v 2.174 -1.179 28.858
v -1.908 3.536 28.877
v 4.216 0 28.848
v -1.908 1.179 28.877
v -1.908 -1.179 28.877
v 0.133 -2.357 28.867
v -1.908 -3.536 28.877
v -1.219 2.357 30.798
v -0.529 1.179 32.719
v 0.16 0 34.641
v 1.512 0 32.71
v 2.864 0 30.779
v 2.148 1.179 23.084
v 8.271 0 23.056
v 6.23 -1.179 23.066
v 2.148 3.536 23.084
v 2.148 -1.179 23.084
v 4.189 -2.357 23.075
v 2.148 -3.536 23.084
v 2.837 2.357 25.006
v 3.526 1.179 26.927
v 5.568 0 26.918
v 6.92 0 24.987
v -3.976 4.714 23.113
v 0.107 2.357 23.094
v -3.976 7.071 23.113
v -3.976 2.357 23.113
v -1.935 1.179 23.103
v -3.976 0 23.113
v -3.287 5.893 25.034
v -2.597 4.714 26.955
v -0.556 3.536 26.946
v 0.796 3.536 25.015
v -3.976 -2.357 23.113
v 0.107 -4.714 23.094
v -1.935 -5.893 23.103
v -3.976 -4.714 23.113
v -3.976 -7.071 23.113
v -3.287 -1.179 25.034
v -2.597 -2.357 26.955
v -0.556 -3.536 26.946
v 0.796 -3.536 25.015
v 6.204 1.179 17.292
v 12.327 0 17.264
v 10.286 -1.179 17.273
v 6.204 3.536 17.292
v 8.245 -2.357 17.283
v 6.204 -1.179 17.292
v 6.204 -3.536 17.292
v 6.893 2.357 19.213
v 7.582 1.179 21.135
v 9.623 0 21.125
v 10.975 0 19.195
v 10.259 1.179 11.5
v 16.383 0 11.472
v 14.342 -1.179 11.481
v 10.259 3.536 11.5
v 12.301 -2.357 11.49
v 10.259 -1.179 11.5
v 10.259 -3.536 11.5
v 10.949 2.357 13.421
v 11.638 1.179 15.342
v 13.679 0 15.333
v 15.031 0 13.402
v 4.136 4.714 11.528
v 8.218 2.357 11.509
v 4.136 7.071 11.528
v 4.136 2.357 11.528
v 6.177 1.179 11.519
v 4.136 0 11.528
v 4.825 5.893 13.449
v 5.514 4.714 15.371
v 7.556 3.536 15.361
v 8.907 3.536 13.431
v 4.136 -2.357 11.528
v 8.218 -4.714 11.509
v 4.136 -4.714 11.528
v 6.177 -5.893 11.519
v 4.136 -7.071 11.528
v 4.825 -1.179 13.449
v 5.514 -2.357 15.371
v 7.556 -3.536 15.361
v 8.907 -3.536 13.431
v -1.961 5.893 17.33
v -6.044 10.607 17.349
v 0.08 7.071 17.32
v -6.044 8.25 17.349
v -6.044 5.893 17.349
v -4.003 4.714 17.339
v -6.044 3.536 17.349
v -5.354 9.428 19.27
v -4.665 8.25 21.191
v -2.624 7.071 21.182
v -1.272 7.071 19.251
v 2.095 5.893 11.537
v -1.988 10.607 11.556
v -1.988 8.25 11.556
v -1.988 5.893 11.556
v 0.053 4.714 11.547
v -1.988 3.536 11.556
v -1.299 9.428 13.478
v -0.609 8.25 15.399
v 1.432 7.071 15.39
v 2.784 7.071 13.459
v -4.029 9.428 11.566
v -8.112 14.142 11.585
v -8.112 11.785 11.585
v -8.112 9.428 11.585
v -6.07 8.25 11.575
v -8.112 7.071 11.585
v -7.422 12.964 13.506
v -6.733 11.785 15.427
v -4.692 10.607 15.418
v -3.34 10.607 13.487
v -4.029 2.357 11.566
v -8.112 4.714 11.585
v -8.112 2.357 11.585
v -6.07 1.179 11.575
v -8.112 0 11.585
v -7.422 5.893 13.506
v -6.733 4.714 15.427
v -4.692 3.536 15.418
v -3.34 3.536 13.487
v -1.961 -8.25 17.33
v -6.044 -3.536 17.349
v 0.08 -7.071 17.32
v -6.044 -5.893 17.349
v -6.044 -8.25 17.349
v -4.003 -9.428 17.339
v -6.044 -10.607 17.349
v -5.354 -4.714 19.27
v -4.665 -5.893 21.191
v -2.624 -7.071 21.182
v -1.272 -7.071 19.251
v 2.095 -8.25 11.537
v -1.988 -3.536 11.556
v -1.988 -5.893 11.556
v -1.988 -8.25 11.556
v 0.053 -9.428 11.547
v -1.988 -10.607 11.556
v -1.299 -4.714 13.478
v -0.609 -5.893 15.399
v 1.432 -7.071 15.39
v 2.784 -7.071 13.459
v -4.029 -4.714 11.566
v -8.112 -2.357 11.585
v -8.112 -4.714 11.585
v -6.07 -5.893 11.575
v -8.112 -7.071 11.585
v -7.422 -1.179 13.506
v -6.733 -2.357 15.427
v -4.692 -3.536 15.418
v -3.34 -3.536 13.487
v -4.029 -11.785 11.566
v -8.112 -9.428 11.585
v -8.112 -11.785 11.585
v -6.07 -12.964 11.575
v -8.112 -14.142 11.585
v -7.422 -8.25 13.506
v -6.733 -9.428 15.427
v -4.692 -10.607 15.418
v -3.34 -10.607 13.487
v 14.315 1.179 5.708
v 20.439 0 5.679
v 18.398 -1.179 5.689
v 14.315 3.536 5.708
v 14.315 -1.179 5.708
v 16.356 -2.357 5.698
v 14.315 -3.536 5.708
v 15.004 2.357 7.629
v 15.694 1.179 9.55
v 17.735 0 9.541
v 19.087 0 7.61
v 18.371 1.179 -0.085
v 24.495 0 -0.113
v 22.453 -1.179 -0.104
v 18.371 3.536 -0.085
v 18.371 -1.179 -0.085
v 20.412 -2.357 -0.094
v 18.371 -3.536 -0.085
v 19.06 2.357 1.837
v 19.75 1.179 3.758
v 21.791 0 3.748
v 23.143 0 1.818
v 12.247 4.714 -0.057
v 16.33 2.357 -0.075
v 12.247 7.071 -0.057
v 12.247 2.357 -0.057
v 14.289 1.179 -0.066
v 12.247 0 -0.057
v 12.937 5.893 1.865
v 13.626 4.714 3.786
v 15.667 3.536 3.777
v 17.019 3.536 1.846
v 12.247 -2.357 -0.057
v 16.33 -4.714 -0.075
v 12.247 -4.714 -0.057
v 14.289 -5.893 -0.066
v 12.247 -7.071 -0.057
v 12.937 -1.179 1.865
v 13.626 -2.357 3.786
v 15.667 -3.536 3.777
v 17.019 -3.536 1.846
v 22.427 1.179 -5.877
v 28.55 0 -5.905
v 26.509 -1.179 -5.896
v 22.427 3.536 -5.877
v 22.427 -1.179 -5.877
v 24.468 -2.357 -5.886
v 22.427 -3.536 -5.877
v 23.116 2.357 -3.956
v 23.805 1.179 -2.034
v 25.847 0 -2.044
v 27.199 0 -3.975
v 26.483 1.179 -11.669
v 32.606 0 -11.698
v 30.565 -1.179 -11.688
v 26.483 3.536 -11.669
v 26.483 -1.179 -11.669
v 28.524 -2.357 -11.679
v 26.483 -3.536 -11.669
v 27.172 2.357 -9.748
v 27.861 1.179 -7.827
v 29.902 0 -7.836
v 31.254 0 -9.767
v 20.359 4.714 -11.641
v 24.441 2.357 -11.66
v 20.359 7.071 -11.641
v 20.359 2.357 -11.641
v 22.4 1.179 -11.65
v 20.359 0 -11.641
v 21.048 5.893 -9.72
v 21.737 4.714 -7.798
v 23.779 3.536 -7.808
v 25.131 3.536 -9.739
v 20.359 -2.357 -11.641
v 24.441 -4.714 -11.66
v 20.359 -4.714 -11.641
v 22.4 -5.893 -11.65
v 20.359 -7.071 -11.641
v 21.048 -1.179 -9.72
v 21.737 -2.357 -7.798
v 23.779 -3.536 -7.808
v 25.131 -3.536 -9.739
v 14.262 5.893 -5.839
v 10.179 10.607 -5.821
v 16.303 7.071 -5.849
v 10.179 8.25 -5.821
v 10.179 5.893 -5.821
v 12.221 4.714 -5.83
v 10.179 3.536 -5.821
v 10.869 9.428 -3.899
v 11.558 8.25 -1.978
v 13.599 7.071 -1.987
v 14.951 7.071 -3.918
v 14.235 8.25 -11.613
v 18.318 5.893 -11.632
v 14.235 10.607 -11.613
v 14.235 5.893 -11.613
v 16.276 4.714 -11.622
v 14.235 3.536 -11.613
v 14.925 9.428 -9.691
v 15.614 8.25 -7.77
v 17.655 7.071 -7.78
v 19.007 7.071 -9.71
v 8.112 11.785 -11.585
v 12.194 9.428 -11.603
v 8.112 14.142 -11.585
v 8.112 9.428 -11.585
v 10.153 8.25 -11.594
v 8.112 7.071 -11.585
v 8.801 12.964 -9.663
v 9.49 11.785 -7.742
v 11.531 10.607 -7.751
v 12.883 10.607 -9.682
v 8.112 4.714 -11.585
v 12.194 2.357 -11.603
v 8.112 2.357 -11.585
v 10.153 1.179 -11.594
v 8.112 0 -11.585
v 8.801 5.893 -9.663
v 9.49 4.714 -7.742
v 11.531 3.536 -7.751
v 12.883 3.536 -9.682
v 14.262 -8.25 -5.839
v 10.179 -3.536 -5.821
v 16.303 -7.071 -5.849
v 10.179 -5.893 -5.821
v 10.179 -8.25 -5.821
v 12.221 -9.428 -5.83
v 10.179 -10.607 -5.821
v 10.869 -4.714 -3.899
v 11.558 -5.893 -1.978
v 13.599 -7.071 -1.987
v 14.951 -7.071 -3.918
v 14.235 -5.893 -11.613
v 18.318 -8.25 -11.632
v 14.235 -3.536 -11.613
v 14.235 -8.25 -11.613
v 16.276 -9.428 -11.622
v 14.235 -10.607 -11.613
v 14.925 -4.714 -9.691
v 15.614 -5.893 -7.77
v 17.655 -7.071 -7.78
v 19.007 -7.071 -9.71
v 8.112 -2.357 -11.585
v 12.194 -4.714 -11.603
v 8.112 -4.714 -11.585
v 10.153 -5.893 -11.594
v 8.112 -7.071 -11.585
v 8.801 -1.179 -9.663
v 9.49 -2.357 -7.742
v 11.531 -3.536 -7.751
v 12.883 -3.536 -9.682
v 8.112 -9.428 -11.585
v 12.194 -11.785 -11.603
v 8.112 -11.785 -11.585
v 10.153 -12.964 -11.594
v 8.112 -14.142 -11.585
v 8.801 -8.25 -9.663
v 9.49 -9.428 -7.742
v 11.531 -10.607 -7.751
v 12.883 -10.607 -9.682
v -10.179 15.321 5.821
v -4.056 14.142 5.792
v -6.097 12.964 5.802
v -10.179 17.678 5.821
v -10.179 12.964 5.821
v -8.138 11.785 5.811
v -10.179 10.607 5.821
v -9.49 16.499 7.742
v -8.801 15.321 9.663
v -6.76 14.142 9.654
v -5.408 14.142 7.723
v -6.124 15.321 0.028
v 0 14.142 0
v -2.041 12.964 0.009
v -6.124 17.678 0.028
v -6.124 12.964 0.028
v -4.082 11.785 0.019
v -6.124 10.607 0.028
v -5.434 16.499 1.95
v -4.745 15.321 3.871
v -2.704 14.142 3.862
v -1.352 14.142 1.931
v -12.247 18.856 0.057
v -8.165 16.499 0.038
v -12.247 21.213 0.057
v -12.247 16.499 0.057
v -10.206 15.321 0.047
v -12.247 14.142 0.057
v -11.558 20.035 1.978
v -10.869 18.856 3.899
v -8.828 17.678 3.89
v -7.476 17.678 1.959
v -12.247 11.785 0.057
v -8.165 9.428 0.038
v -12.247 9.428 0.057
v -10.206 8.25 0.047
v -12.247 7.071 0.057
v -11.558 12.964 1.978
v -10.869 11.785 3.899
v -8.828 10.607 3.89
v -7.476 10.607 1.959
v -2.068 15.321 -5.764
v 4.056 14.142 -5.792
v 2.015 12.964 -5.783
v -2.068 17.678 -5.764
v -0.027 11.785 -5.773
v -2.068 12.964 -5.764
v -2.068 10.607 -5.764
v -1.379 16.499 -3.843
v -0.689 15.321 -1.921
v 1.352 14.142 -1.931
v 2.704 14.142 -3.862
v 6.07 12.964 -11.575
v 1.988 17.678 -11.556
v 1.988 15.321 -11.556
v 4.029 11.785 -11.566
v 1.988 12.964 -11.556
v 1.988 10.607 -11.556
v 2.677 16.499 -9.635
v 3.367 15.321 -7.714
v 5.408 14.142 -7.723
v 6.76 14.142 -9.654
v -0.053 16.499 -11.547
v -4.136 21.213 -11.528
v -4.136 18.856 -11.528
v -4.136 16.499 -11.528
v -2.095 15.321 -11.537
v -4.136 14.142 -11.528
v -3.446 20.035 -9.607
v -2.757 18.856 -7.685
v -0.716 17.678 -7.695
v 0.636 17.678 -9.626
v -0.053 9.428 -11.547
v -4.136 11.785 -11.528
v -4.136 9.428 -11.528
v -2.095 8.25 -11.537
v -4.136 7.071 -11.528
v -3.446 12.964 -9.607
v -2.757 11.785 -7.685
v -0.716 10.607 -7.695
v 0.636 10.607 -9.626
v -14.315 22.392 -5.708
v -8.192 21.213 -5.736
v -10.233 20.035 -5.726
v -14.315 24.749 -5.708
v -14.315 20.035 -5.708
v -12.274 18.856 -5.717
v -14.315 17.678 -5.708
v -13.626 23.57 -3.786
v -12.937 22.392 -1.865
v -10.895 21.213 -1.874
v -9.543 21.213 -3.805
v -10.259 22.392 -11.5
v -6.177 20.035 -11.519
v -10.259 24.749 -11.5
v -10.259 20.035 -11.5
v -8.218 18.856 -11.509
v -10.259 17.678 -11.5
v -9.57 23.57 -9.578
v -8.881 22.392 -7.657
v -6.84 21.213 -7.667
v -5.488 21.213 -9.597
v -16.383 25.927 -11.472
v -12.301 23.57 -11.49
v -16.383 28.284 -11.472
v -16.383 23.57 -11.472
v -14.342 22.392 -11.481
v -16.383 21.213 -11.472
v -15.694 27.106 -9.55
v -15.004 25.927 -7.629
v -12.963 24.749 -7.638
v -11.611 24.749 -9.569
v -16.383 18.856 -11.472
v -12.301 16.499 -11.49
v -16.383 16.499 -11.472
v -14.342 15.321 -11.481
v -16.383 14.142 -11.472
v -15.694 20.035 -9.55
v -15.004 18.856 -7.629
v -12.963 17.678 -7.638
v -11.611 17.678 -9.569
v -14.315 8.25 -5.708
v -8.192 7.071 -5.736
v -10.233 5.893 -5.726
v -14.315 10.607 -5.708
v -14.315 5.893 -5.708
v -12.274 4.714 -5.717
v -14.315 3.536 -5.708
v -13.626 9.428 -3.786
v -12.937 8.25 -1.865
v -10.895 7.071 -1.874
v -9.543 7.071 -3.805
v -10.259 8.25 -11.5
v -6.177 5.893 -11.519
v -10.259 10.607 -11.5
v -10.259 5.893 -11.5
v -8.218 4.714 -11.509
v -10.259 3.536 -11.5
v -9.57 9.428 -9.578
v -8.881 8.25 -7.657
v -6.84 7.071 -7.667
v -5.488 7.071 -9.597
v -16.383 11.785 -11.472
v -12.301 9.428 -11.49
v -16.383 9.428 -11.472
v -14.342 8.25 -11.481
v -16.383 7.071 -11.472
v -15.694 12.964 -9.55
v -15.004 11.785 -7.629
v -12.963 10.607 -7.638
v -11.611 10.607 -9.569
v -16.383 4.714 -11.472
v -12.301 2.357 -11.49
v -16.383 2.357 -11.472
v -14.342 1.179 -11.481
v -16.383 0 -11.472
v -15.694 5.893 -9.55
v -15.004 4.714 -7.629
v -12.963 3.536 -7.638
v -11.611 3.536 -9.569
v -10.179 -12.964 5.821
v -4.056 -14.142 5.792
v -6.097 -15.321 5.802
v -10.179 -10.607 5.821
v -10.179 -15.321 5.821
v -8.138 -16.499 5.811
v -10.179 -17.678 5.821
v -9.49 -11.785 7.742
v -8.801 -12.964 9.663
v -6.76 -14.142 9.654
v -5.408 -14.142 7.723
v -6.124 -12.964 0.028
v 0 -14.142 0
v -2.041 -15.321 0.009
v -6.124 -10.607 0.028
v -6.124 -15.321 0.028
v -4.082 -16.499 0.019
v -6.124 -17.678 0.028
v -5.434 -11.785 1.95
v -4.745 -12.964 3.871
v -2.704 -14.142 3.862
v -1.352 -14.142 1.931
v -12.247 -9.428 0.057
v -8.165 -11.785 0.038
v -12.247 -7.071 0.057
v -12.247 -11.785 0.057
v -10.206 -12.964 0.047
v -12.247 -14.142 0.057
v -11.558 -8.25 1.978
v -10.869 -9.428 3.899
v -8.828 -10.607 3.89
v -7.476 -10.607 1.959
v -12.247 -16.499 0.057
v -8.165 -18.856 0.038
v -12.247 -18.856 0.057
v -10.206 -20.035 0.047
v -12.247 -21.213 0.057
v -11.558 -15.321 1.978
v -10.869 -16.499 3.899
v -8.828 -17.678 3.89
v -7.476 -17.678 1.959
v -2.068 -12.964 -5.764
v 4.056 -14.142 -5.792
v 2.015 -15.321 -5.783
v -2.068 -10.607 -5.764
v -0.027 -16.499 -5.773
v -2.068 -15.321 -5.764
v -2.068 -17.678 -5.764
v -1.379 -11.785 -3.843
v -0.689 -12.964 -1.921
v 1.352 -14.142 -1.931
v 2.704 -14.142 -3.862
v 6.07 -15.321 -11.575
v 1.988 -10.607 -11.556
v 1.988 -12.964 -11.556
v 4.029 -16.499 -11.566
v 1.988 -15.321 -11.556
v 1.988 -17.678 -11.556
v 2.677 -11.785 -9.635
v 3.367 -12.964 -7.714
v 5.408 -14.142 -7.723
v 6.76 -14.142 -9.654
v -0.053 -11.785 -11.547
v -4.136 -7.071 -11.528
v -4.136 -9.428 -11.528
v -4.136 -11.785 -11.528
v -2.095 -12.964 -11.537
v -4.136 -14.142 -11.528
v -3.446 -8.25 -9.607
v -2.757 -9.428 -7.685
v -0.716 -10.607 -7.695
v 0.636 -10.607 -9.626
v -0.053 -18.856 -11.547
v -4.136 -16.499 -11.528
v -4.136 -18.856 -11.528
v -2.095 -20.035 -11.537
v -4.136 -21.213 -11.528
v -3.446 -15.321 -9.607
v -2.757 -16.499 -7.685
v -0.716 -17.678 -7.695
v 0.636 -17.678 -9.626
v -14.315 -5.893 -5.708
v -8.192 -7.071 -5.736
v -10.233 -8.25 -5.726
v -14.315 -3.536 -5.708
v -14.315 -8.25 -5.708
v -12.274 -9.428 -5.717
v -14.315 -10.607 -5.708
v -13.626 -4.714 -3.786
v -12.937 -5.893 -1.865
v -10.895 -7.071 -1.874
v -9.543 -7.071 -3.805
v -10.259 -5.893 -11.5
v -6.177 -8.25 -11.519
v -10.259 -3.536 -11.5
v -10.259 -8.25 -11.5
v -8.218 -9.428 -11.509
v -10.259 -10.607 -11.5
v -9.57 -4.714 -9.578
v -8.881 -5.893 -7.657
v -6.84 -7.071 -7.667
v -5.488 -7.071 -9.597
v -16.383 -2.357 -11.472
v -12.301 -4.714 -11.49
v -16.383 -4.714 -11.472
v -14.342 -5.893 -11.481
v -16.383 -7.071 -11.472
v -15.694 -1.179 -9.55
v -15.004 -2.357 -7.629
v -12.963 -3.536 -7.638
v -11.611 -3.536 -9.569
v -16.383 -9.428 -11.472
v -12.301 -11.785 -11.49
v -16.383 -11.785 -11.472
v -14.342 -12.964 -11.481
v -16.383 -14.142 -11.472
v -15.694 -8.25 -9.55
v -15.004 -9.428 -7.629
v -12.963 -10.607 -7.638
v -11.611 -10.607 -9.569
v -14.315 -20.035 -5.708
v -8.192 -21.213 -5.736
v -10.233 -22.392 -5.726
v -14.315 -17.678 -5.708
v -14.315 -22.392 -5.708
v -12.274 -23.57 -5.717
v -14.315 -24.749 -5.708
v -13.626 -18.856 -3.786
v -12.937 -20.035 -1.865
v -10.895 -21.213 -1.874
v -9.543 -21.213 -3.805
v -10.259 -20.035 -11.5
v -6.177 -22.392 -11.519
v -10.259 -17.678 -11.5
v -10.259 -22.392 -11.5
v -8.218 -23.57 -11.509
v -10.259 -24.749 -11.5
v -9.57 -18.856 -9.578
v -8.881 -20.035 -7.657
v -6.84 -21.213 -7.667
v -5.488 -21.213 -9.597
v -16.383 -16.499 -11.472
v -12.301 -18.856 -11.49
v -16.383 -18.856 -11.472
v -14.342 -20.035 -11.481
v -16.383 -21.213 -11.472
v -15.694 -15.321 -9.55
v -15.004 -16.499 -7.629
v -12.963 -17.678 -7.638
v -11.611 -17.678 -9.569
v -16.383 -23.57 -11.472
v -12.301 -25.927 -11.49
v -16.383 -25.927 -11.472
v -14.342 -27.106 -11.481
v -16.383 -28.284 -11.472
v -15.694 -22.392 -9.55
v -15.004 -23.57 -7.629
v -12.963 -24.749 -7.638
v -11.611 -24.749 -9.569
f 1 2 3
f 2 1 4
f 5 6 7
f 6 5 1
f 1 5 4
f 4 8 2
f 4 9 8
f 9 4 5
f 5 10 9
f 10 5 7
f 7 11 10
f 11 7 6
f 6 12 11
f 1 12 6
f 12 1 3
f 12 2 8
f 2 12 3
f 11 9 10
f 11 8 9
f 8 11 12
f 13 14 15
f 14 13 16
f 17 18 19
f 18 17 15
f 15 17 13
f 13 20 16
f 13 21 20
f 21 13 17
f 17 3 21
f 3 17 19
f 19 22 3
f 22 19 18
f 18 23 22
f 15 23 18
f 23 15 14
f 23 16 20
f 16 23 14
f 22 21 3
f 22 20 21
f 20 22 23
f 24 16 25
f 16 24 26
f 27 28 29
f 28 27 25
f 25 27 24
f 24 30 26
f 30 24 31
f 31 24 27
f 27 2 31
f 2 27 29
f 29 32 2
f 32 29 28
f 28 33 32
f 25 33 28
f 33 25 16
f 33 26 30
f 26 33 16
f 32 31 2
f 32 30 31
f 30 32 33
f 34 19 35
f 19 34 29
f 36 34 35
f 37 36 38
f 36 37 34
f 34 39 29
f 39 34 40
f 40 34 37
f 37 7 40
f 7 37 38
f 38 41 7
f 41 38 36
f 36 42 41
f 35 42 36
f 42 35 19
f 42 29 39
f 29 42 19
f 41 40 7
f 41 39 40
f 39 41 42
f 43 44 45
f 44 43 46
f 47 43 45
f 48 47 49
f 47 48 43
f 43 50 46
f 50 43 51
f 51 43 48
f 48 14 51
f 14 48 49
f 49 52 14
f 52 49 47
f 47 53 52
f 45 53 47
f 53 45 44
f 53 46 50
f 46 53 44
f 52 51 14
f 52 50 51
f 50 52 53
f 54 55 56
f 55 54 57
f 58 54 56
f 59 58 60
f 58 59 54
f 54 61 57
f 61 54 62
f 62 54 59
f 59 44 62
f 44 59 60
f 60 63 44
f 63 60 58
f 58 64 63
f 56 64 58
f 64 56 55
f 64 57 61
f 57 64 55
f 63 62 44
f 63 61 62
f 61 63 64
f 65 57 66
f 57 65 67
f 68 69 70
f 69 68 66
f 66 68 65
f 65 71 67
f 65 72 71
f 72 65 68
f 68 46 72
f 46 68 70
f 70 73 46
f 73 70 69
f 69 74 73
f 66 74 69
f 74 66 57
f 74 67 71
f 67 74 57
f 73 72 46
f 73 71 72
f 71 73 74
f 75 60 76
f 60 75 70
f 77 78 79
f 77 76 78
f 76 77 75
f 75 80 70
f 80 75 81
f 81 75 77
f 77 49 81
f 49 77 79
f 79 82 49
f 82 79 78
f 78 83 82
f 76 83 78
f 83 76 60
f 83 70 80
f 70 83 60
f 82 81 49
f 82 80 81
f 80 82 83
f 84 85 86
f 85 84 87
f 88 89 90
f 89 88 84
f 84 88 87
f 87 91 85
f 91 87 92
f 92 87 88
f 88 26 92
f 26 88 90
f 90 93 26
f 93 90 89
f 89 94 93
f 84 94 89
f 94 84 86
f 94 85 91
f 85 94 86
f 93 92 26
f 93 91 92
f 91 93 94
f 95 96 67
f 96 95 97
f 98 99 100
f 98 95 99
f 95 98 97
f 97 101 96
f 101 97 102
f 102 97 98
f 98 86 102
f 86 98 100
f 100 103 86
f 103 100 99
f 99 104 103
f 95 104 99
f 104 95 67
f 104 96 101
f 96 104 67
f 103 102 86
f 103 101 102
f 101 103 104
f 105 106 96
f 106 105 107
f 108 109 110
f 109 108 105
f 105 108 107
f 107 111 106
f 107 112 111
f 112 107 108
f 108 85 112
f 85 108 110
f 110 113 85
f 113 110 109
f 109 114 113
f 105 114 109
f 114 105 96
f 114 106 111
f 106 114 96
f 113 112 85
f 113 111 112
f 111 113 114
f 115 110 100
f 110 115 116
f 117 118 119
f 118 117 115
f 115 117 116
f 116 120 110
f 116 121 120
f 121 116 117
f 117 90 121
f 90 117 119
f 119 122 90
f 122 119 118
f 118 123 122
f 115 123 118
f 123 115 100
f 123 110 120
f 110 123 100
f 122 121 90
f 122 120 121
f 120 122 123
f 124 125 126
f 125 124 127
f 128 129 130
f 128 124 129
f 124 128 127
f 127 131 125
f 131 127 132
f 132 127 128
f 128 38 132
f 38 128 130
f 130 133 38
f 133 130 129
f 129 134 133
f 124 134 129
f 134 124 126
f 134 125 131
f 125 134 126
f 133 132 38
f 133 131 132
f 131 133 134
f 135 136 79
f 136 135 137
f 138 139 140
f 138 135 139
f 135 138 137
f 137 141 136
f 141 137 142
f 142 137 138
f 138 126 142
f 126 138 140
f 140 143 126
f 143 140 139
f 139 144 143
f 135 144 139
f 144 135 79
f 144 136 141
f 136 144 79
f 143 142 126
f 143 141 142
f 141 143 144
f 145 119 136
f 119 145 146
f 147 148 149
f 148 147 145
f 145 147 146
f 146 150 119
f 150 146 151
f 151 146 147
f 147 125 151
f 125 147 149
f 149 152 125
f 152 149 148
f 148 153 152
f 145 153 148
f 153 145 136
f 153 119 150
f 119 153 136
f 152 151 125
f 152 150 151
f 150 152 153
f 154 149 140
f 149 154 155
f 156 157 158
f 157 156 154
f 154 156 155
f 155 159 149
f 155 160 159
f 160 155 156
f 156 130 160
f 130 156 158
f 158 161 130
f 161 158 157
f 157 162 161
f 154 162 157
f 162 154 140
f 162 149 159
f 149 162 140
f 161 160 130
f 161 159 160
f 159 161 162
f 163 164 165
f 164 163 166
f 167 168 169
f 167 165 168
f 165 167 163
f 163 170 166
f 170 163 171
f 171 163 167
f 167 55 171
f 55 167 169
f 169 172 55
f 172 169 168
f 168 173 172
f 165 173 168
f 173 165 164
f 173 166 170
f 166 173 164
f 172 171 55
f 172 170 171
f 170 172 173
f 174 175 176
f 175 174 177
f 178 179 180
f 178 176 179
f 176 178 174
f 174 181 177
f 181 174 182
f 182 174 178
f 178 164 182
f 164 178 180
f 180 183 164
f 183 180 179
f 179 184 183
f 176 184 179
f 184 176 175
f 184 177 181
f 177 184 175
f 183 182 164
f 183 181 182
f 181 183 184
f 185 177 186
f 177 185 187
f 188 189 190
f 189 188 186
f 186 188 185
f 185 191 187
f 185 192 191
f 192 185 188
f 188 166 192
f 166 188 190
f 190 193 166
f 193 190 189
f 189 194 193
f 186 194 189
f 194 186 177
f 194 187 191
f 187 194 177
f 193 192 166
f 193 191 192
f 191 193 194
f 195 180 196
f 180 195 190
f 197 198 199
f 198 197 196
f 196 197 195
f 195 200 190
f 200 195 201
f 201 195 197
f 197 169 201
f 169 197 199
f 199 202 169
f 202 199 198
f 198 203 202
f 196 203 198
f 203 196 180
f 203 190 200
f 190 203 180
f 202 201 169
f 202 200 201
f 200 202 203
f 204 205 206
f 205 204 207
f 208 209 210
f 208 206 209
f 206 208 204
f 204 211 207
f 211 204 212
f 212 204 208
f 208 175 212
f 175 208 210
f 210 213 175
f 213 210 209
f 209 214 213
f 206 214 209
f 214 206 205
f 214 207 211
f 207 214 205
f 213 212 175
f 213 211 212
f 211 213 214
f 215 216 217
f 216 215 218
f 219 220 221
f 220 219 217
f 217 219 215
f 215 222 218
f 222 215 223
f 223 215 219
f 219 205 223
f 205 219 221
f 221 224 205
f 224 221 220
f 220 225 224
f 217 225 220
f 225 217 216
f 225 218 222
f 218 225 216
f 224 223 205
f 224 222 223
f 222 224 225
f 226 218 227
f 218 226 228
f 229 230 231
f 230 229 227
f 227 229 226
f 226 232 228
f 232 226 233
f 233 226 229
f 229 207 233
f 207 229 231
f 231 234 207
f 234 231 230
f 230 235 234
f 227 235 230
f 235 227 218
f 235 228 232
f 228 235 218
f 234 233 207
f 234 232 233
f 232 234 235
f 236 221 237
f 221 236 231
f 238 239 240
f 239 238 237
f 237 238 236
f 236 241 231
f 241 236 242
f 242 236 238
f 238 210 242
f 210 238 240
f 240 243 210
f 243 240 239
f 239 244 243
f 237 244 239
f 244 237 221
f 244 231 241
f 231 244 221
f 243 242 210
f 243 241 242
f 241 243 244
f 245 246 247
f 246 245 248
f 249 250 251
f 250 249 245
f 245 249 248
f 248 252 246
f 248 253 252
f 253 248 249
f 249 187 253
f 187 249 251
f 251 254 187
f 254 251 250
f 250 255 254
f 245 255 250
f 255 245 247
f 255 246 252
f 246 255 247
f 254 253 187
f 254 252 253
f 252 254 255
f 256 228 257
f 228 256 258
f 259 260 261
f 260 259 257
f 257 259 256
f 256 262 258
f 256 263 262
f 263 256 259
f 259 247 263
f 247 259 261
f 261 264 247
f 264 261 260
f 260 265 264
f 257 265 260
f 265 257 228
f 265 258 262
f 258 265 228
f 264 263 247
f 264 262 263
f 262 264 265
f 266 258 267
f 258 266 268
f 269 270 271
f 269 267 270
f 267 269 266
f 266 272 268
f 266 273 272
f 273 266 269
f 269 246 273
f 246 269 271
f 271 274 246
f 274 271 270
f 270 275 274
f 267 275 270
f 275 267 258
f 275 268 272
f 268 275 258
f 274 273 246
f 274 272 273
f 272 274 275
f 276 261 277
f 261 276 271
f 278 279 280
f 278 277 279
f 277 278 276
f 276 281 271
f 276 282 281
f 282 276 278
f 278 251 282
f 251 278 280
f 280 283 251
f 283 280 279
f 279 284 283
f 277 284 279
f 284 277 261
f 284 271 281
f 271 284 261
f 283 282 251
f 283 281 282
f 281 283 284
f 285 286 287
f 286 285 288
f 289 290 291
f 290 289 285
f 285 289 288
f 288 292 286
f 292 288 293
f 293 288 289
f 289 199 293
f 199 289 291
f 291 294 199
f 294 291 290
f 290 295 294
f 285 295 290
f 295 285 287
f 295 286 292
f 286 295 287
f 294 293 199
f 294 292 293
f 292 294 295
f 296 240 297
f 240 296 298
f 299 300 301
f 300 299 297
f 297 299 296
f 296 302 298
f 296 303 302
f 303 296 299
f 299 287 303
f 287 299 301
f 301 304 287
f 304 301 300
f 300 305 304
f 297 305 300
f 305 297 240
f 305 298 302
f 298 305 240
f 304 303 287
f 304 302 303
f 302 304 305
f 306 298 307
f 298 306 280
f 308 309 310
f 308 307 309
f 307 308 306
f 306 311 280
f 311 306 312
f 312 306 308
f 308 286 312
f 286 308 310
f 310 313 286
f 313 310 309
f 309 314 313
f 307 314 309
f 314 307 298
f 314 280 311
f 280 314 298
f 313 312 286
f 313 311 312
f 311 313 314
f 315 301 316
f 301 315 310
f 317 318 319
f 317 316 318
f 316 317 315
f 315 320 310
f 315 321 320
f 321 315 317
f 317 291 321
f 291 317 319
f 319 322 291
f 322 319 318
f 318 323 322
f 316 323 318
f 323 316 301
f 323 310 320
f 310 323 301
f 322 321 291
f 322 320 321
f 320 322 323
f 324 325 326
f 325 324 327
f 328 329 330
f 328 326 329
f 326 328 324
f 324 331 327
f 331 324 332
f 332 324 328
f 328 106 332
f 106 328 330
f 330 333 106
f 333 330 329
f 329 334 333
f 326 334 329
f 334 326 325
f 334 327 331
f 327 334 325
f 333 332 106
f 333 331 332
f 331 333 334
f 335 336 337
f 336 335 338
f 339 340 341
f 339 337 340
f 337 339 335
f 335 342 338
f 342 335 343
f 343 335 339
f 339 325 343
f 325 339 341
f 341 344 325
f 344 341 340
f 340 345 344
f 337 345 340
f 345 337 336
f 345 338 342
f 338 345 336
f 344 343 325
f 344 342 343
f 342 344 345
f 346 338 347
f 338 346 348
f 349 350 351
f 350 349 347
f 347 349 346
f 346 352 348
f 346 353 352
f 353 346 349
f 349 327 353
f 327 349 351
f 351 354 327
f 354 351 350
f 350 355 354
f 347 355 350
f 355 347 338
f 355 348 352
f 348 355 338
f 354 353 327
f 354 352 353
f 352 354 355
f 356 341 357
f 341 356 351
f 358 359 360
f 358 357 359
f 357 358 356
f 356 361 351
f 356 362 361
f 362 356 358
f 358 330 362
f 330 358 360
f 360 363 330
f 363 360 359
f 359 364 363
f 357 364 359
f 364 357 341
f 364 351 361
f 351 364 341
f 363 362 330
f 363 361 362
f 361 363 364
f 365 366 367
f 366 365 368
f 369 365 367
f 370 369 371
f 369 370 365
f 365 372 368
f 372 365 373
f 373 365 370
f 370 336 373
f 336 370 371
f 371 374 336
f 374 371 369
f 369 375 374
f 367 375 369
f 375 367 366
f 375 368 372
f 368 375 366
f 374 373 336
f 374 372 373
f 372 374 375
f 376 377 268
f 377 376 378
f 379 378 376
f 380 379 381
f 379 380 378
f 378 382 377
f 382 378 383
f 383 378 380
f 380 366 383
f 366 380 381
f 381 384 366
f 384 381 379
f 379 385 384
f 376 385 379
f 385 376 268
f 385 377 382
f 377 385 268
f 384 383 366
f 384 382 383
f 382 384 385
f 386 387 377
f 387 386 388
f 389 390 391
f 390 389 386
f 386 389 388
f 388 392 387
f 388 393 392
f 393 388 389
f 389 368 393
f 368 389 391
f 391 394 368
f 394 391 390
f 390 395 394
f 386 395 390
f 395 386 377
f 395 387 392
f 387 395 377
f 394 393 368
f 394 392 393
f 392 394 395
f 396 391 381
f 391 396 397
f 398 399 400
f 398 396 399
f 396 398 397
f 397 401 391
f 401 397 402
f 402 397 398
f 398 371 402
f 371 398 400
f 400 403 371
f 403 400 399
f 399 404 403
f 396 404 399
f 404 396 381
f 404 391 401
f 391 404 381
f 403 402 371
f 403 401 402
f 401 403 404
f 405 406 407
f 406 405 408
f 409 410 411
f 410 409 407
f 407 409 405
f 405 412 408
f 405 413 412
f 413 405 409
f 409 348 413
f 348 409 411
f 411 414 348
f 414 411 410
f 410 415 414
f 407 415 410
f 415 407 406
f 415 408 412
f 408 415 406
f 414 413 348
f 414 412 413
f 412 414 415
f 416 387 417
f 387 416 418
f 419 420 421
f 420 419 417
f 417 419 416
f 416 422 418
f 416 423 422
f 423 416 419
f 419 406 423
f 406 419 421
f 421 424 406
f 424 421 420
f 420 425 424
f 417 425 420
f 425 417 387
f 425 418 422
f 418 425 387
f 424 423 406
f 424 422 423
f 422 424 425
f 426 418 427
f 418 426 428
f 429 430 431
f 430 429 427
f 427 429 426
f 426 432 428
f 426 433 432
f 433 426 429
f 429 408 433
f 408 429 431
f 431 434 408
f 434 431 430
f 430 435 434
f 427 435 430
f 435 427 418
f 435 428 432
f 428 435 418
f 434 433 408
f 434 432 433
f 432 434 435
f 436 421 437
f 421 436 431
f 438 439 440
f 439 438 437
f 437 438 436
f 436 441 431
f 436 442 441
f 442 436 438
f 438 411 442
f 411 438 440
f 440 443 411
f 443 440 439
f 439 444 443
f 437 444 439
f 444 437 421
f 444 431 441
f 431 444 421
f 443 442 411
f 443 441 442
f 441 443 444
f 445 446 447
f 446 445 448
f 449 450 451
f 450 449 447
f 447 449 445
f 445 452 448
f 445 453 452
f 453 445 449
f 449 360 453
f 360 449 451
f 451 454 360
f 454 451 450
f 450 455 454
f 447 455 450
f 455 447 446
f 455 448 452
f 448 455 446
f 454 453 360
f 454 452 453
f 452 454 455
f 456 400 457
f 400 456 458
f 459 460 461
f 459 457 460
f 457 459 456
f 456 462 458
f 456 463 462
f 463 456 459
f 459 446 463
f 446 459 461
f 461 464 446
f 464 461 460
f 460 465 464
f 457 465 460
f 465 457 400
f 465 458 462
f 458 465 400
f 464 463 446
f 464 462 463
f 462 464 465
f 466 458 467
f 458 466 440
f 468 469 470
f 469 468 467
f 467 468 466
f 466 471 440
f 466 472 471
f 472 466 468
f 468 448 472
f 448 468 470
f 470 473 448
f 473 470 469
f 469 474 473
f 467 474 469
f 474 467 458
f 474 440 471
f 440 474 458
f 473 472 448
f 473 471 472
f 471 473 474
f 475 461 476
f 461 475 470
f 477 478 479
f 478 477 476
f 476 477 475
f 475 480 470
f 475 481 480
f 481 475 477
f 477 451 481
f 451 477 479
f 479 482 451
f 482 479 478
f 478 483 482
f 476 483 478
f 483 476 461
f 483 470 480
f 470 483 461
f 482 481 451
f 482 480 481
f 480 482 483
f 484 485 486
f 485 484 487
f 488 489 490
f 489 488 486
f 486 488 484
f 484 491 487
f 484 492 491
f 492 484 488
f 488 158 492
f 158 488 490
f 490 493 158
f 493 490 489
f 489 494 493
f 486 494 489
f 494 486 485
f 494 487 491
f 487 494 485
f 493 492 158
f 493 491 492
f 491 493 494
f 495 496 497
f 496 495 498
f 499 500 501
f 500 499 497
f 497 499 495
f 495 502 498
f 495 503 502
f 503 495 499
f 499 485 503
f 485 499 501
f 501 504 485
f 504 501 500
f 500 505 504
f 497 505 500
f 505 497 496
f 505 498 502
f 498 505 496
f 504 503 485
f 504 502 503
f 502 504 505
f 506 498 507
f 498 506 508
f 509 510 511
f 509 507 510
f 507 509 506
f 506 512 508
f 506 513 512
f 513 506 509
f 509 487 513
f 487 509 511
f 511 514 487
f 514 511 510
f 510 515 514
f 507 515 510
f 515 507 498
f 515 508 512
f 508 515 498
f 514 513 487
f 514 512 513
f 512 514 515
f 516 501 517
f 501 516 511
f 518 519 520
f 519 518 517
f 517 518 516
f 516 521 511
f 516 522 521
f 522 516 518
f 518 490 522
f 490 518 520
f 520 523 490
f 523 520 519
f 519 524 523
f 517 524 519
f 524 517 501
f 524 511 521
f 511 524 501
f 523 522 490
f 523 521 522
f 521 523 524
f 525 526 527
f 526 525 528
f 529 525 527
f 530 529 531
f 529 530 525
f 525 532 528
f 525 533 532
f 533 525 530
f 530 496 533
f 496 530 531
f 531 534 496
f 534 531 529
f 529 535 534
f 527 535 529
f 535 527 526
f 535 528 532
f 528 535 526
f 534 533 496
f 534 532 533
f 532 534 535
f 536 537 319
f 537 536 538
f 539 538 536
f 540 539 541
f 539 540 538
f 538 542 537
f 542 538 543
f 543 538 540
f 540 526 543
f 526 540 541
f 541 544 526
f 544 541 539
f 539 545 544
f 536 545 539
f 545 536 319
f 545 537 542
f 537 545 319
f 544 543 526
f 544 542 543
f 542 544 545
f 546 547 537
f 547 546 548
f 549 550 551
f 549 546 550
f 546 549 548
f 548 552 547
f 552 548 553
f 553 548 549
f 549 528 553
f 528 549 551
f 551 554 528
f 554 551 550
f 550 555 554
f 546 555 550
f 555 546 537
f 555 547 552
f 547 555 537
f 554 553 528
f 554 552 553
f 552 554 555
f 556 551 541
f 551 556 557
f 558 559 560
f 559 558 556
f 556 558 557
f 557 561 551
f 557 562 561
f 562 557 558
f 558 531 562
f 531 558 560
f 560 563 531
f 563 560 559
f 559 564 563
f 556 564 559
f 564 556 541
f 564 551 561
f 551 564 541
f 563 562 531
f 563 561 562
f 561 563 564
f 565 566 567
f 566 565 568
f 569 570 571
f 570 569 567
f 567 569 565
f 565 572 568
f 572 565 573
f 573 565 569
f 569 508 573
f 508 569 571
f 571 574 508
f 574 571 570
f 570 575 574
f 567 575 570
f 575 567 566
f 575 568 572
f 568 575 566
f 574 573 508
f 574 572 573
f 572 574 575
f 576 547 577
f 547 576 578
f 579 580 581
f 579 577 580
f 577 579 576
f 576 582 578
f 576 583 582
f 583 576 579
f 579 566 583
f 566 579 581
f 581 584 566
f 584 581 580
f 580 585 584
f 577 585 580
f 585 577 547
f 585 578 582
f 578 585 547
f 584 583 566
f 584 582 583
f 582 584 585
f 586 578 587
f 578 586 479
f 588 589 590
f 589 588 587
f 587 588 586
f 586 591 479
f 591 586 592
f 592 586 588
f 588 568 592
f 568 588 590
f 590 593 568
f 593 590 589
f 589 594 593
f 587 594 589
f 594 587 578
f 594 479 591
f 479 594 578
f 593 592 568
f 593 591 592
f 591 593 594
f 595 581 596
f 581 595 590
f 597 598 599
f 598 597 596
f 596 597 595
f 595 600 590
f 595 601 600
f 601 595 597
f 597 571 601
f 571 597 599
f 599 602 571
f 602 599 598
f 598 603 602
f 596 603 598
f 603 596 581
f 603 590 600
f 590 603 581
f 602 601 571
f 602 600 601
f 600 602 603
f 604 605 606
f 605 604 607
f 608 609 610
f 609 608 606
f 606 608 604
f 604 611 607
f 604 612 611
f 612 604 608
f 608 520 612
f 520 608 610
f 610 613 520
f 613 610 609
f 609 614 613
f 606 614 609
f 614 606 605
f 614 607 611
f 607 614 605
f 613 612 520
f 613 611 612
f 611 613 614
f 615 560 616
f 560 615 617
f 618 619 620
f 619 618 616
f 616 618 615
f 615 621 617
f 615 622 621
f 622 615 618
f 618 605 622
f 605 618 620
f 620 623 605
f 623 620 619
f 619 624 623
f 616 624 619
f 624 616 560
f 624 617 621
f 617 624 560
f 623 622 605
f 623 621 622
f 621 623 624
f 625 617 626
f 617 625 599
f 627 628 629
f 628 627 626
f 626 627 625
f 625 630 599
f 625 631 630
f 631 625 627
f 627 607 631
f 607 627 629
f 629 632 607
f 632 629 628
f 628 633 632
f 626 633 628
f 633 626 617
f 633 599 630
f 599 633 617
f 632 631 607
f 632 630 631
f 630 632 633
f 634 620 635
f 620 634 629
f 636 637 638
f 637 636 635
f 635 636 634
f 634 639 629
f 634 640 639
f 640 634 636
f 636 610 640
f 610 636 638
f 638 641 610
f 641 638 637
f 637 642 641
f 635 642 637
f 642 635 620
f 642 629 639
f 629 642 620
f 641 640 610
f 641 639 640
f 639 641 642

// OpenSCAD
// Sierpinski tetrahedron fractal — additive (union of 4 corner sub-tetrahedra)
// Uses only cube intersections so the raytracer can handle it as CSG primitives.
// Union-of-intersections is already in sum-of-products form, so F5 preview
// normalizes trivially (no combinatorial explosion).

level = 3;

// Tetrahedron via intersection of 4 rotated+translated cubes, centered at origin.
module tetrahedron(edge) {
  big = edge * 2;
  r = edge * sqrt(6) / 12;
  off = big / 2 - r;

  a1 = acos(1 / sqrt(3));
  a2 = acos(-1 / sqrt(3));

  n0 = [1, 1, 1] / sqrt(3);
  n1 = [1, -1, -1] / sqrt(3);
  n2 = [-1, 1, -1] / sqrt(3);
  n3 = [-1, -1, 1] / sqrt(3);

  intersection() {
    translate(off * n0) rotate(a=a1, v=[-1, 1, 0])  cube(big, center=true);
    translate(off * n1) rotate(a=a2, v=[1, 1, 0])   cube(big, center=true);
    translate(off * n2) rotate(a=a2, v=[-1, -1, 0]) cube(big, center=true);
    translate(off * n3) rotate(a=a1, v=[1, -1, 0])  cube(big, center=true);
  }
}

// Recursively place 4 half-scale tetrahedra at the corners.
module sierpinski(edge, lvl) {
  if (lvl == 0) {
    tetrahedron(edge);
  } else {
    d = edge * sqrt(6) / 8;
    for (n = [[1,1,1], [1,-1,-1], [-1,1,-1], [-1,-1,1]])
      translate(d * n / sqrt(3))
        sierpinski(edge / 2, lvl - 1);
  }
}

edge = 40 * sqrt(2);

rotate([45,-35,0])
color("goldenrod")
sierpinski(edge, level);
